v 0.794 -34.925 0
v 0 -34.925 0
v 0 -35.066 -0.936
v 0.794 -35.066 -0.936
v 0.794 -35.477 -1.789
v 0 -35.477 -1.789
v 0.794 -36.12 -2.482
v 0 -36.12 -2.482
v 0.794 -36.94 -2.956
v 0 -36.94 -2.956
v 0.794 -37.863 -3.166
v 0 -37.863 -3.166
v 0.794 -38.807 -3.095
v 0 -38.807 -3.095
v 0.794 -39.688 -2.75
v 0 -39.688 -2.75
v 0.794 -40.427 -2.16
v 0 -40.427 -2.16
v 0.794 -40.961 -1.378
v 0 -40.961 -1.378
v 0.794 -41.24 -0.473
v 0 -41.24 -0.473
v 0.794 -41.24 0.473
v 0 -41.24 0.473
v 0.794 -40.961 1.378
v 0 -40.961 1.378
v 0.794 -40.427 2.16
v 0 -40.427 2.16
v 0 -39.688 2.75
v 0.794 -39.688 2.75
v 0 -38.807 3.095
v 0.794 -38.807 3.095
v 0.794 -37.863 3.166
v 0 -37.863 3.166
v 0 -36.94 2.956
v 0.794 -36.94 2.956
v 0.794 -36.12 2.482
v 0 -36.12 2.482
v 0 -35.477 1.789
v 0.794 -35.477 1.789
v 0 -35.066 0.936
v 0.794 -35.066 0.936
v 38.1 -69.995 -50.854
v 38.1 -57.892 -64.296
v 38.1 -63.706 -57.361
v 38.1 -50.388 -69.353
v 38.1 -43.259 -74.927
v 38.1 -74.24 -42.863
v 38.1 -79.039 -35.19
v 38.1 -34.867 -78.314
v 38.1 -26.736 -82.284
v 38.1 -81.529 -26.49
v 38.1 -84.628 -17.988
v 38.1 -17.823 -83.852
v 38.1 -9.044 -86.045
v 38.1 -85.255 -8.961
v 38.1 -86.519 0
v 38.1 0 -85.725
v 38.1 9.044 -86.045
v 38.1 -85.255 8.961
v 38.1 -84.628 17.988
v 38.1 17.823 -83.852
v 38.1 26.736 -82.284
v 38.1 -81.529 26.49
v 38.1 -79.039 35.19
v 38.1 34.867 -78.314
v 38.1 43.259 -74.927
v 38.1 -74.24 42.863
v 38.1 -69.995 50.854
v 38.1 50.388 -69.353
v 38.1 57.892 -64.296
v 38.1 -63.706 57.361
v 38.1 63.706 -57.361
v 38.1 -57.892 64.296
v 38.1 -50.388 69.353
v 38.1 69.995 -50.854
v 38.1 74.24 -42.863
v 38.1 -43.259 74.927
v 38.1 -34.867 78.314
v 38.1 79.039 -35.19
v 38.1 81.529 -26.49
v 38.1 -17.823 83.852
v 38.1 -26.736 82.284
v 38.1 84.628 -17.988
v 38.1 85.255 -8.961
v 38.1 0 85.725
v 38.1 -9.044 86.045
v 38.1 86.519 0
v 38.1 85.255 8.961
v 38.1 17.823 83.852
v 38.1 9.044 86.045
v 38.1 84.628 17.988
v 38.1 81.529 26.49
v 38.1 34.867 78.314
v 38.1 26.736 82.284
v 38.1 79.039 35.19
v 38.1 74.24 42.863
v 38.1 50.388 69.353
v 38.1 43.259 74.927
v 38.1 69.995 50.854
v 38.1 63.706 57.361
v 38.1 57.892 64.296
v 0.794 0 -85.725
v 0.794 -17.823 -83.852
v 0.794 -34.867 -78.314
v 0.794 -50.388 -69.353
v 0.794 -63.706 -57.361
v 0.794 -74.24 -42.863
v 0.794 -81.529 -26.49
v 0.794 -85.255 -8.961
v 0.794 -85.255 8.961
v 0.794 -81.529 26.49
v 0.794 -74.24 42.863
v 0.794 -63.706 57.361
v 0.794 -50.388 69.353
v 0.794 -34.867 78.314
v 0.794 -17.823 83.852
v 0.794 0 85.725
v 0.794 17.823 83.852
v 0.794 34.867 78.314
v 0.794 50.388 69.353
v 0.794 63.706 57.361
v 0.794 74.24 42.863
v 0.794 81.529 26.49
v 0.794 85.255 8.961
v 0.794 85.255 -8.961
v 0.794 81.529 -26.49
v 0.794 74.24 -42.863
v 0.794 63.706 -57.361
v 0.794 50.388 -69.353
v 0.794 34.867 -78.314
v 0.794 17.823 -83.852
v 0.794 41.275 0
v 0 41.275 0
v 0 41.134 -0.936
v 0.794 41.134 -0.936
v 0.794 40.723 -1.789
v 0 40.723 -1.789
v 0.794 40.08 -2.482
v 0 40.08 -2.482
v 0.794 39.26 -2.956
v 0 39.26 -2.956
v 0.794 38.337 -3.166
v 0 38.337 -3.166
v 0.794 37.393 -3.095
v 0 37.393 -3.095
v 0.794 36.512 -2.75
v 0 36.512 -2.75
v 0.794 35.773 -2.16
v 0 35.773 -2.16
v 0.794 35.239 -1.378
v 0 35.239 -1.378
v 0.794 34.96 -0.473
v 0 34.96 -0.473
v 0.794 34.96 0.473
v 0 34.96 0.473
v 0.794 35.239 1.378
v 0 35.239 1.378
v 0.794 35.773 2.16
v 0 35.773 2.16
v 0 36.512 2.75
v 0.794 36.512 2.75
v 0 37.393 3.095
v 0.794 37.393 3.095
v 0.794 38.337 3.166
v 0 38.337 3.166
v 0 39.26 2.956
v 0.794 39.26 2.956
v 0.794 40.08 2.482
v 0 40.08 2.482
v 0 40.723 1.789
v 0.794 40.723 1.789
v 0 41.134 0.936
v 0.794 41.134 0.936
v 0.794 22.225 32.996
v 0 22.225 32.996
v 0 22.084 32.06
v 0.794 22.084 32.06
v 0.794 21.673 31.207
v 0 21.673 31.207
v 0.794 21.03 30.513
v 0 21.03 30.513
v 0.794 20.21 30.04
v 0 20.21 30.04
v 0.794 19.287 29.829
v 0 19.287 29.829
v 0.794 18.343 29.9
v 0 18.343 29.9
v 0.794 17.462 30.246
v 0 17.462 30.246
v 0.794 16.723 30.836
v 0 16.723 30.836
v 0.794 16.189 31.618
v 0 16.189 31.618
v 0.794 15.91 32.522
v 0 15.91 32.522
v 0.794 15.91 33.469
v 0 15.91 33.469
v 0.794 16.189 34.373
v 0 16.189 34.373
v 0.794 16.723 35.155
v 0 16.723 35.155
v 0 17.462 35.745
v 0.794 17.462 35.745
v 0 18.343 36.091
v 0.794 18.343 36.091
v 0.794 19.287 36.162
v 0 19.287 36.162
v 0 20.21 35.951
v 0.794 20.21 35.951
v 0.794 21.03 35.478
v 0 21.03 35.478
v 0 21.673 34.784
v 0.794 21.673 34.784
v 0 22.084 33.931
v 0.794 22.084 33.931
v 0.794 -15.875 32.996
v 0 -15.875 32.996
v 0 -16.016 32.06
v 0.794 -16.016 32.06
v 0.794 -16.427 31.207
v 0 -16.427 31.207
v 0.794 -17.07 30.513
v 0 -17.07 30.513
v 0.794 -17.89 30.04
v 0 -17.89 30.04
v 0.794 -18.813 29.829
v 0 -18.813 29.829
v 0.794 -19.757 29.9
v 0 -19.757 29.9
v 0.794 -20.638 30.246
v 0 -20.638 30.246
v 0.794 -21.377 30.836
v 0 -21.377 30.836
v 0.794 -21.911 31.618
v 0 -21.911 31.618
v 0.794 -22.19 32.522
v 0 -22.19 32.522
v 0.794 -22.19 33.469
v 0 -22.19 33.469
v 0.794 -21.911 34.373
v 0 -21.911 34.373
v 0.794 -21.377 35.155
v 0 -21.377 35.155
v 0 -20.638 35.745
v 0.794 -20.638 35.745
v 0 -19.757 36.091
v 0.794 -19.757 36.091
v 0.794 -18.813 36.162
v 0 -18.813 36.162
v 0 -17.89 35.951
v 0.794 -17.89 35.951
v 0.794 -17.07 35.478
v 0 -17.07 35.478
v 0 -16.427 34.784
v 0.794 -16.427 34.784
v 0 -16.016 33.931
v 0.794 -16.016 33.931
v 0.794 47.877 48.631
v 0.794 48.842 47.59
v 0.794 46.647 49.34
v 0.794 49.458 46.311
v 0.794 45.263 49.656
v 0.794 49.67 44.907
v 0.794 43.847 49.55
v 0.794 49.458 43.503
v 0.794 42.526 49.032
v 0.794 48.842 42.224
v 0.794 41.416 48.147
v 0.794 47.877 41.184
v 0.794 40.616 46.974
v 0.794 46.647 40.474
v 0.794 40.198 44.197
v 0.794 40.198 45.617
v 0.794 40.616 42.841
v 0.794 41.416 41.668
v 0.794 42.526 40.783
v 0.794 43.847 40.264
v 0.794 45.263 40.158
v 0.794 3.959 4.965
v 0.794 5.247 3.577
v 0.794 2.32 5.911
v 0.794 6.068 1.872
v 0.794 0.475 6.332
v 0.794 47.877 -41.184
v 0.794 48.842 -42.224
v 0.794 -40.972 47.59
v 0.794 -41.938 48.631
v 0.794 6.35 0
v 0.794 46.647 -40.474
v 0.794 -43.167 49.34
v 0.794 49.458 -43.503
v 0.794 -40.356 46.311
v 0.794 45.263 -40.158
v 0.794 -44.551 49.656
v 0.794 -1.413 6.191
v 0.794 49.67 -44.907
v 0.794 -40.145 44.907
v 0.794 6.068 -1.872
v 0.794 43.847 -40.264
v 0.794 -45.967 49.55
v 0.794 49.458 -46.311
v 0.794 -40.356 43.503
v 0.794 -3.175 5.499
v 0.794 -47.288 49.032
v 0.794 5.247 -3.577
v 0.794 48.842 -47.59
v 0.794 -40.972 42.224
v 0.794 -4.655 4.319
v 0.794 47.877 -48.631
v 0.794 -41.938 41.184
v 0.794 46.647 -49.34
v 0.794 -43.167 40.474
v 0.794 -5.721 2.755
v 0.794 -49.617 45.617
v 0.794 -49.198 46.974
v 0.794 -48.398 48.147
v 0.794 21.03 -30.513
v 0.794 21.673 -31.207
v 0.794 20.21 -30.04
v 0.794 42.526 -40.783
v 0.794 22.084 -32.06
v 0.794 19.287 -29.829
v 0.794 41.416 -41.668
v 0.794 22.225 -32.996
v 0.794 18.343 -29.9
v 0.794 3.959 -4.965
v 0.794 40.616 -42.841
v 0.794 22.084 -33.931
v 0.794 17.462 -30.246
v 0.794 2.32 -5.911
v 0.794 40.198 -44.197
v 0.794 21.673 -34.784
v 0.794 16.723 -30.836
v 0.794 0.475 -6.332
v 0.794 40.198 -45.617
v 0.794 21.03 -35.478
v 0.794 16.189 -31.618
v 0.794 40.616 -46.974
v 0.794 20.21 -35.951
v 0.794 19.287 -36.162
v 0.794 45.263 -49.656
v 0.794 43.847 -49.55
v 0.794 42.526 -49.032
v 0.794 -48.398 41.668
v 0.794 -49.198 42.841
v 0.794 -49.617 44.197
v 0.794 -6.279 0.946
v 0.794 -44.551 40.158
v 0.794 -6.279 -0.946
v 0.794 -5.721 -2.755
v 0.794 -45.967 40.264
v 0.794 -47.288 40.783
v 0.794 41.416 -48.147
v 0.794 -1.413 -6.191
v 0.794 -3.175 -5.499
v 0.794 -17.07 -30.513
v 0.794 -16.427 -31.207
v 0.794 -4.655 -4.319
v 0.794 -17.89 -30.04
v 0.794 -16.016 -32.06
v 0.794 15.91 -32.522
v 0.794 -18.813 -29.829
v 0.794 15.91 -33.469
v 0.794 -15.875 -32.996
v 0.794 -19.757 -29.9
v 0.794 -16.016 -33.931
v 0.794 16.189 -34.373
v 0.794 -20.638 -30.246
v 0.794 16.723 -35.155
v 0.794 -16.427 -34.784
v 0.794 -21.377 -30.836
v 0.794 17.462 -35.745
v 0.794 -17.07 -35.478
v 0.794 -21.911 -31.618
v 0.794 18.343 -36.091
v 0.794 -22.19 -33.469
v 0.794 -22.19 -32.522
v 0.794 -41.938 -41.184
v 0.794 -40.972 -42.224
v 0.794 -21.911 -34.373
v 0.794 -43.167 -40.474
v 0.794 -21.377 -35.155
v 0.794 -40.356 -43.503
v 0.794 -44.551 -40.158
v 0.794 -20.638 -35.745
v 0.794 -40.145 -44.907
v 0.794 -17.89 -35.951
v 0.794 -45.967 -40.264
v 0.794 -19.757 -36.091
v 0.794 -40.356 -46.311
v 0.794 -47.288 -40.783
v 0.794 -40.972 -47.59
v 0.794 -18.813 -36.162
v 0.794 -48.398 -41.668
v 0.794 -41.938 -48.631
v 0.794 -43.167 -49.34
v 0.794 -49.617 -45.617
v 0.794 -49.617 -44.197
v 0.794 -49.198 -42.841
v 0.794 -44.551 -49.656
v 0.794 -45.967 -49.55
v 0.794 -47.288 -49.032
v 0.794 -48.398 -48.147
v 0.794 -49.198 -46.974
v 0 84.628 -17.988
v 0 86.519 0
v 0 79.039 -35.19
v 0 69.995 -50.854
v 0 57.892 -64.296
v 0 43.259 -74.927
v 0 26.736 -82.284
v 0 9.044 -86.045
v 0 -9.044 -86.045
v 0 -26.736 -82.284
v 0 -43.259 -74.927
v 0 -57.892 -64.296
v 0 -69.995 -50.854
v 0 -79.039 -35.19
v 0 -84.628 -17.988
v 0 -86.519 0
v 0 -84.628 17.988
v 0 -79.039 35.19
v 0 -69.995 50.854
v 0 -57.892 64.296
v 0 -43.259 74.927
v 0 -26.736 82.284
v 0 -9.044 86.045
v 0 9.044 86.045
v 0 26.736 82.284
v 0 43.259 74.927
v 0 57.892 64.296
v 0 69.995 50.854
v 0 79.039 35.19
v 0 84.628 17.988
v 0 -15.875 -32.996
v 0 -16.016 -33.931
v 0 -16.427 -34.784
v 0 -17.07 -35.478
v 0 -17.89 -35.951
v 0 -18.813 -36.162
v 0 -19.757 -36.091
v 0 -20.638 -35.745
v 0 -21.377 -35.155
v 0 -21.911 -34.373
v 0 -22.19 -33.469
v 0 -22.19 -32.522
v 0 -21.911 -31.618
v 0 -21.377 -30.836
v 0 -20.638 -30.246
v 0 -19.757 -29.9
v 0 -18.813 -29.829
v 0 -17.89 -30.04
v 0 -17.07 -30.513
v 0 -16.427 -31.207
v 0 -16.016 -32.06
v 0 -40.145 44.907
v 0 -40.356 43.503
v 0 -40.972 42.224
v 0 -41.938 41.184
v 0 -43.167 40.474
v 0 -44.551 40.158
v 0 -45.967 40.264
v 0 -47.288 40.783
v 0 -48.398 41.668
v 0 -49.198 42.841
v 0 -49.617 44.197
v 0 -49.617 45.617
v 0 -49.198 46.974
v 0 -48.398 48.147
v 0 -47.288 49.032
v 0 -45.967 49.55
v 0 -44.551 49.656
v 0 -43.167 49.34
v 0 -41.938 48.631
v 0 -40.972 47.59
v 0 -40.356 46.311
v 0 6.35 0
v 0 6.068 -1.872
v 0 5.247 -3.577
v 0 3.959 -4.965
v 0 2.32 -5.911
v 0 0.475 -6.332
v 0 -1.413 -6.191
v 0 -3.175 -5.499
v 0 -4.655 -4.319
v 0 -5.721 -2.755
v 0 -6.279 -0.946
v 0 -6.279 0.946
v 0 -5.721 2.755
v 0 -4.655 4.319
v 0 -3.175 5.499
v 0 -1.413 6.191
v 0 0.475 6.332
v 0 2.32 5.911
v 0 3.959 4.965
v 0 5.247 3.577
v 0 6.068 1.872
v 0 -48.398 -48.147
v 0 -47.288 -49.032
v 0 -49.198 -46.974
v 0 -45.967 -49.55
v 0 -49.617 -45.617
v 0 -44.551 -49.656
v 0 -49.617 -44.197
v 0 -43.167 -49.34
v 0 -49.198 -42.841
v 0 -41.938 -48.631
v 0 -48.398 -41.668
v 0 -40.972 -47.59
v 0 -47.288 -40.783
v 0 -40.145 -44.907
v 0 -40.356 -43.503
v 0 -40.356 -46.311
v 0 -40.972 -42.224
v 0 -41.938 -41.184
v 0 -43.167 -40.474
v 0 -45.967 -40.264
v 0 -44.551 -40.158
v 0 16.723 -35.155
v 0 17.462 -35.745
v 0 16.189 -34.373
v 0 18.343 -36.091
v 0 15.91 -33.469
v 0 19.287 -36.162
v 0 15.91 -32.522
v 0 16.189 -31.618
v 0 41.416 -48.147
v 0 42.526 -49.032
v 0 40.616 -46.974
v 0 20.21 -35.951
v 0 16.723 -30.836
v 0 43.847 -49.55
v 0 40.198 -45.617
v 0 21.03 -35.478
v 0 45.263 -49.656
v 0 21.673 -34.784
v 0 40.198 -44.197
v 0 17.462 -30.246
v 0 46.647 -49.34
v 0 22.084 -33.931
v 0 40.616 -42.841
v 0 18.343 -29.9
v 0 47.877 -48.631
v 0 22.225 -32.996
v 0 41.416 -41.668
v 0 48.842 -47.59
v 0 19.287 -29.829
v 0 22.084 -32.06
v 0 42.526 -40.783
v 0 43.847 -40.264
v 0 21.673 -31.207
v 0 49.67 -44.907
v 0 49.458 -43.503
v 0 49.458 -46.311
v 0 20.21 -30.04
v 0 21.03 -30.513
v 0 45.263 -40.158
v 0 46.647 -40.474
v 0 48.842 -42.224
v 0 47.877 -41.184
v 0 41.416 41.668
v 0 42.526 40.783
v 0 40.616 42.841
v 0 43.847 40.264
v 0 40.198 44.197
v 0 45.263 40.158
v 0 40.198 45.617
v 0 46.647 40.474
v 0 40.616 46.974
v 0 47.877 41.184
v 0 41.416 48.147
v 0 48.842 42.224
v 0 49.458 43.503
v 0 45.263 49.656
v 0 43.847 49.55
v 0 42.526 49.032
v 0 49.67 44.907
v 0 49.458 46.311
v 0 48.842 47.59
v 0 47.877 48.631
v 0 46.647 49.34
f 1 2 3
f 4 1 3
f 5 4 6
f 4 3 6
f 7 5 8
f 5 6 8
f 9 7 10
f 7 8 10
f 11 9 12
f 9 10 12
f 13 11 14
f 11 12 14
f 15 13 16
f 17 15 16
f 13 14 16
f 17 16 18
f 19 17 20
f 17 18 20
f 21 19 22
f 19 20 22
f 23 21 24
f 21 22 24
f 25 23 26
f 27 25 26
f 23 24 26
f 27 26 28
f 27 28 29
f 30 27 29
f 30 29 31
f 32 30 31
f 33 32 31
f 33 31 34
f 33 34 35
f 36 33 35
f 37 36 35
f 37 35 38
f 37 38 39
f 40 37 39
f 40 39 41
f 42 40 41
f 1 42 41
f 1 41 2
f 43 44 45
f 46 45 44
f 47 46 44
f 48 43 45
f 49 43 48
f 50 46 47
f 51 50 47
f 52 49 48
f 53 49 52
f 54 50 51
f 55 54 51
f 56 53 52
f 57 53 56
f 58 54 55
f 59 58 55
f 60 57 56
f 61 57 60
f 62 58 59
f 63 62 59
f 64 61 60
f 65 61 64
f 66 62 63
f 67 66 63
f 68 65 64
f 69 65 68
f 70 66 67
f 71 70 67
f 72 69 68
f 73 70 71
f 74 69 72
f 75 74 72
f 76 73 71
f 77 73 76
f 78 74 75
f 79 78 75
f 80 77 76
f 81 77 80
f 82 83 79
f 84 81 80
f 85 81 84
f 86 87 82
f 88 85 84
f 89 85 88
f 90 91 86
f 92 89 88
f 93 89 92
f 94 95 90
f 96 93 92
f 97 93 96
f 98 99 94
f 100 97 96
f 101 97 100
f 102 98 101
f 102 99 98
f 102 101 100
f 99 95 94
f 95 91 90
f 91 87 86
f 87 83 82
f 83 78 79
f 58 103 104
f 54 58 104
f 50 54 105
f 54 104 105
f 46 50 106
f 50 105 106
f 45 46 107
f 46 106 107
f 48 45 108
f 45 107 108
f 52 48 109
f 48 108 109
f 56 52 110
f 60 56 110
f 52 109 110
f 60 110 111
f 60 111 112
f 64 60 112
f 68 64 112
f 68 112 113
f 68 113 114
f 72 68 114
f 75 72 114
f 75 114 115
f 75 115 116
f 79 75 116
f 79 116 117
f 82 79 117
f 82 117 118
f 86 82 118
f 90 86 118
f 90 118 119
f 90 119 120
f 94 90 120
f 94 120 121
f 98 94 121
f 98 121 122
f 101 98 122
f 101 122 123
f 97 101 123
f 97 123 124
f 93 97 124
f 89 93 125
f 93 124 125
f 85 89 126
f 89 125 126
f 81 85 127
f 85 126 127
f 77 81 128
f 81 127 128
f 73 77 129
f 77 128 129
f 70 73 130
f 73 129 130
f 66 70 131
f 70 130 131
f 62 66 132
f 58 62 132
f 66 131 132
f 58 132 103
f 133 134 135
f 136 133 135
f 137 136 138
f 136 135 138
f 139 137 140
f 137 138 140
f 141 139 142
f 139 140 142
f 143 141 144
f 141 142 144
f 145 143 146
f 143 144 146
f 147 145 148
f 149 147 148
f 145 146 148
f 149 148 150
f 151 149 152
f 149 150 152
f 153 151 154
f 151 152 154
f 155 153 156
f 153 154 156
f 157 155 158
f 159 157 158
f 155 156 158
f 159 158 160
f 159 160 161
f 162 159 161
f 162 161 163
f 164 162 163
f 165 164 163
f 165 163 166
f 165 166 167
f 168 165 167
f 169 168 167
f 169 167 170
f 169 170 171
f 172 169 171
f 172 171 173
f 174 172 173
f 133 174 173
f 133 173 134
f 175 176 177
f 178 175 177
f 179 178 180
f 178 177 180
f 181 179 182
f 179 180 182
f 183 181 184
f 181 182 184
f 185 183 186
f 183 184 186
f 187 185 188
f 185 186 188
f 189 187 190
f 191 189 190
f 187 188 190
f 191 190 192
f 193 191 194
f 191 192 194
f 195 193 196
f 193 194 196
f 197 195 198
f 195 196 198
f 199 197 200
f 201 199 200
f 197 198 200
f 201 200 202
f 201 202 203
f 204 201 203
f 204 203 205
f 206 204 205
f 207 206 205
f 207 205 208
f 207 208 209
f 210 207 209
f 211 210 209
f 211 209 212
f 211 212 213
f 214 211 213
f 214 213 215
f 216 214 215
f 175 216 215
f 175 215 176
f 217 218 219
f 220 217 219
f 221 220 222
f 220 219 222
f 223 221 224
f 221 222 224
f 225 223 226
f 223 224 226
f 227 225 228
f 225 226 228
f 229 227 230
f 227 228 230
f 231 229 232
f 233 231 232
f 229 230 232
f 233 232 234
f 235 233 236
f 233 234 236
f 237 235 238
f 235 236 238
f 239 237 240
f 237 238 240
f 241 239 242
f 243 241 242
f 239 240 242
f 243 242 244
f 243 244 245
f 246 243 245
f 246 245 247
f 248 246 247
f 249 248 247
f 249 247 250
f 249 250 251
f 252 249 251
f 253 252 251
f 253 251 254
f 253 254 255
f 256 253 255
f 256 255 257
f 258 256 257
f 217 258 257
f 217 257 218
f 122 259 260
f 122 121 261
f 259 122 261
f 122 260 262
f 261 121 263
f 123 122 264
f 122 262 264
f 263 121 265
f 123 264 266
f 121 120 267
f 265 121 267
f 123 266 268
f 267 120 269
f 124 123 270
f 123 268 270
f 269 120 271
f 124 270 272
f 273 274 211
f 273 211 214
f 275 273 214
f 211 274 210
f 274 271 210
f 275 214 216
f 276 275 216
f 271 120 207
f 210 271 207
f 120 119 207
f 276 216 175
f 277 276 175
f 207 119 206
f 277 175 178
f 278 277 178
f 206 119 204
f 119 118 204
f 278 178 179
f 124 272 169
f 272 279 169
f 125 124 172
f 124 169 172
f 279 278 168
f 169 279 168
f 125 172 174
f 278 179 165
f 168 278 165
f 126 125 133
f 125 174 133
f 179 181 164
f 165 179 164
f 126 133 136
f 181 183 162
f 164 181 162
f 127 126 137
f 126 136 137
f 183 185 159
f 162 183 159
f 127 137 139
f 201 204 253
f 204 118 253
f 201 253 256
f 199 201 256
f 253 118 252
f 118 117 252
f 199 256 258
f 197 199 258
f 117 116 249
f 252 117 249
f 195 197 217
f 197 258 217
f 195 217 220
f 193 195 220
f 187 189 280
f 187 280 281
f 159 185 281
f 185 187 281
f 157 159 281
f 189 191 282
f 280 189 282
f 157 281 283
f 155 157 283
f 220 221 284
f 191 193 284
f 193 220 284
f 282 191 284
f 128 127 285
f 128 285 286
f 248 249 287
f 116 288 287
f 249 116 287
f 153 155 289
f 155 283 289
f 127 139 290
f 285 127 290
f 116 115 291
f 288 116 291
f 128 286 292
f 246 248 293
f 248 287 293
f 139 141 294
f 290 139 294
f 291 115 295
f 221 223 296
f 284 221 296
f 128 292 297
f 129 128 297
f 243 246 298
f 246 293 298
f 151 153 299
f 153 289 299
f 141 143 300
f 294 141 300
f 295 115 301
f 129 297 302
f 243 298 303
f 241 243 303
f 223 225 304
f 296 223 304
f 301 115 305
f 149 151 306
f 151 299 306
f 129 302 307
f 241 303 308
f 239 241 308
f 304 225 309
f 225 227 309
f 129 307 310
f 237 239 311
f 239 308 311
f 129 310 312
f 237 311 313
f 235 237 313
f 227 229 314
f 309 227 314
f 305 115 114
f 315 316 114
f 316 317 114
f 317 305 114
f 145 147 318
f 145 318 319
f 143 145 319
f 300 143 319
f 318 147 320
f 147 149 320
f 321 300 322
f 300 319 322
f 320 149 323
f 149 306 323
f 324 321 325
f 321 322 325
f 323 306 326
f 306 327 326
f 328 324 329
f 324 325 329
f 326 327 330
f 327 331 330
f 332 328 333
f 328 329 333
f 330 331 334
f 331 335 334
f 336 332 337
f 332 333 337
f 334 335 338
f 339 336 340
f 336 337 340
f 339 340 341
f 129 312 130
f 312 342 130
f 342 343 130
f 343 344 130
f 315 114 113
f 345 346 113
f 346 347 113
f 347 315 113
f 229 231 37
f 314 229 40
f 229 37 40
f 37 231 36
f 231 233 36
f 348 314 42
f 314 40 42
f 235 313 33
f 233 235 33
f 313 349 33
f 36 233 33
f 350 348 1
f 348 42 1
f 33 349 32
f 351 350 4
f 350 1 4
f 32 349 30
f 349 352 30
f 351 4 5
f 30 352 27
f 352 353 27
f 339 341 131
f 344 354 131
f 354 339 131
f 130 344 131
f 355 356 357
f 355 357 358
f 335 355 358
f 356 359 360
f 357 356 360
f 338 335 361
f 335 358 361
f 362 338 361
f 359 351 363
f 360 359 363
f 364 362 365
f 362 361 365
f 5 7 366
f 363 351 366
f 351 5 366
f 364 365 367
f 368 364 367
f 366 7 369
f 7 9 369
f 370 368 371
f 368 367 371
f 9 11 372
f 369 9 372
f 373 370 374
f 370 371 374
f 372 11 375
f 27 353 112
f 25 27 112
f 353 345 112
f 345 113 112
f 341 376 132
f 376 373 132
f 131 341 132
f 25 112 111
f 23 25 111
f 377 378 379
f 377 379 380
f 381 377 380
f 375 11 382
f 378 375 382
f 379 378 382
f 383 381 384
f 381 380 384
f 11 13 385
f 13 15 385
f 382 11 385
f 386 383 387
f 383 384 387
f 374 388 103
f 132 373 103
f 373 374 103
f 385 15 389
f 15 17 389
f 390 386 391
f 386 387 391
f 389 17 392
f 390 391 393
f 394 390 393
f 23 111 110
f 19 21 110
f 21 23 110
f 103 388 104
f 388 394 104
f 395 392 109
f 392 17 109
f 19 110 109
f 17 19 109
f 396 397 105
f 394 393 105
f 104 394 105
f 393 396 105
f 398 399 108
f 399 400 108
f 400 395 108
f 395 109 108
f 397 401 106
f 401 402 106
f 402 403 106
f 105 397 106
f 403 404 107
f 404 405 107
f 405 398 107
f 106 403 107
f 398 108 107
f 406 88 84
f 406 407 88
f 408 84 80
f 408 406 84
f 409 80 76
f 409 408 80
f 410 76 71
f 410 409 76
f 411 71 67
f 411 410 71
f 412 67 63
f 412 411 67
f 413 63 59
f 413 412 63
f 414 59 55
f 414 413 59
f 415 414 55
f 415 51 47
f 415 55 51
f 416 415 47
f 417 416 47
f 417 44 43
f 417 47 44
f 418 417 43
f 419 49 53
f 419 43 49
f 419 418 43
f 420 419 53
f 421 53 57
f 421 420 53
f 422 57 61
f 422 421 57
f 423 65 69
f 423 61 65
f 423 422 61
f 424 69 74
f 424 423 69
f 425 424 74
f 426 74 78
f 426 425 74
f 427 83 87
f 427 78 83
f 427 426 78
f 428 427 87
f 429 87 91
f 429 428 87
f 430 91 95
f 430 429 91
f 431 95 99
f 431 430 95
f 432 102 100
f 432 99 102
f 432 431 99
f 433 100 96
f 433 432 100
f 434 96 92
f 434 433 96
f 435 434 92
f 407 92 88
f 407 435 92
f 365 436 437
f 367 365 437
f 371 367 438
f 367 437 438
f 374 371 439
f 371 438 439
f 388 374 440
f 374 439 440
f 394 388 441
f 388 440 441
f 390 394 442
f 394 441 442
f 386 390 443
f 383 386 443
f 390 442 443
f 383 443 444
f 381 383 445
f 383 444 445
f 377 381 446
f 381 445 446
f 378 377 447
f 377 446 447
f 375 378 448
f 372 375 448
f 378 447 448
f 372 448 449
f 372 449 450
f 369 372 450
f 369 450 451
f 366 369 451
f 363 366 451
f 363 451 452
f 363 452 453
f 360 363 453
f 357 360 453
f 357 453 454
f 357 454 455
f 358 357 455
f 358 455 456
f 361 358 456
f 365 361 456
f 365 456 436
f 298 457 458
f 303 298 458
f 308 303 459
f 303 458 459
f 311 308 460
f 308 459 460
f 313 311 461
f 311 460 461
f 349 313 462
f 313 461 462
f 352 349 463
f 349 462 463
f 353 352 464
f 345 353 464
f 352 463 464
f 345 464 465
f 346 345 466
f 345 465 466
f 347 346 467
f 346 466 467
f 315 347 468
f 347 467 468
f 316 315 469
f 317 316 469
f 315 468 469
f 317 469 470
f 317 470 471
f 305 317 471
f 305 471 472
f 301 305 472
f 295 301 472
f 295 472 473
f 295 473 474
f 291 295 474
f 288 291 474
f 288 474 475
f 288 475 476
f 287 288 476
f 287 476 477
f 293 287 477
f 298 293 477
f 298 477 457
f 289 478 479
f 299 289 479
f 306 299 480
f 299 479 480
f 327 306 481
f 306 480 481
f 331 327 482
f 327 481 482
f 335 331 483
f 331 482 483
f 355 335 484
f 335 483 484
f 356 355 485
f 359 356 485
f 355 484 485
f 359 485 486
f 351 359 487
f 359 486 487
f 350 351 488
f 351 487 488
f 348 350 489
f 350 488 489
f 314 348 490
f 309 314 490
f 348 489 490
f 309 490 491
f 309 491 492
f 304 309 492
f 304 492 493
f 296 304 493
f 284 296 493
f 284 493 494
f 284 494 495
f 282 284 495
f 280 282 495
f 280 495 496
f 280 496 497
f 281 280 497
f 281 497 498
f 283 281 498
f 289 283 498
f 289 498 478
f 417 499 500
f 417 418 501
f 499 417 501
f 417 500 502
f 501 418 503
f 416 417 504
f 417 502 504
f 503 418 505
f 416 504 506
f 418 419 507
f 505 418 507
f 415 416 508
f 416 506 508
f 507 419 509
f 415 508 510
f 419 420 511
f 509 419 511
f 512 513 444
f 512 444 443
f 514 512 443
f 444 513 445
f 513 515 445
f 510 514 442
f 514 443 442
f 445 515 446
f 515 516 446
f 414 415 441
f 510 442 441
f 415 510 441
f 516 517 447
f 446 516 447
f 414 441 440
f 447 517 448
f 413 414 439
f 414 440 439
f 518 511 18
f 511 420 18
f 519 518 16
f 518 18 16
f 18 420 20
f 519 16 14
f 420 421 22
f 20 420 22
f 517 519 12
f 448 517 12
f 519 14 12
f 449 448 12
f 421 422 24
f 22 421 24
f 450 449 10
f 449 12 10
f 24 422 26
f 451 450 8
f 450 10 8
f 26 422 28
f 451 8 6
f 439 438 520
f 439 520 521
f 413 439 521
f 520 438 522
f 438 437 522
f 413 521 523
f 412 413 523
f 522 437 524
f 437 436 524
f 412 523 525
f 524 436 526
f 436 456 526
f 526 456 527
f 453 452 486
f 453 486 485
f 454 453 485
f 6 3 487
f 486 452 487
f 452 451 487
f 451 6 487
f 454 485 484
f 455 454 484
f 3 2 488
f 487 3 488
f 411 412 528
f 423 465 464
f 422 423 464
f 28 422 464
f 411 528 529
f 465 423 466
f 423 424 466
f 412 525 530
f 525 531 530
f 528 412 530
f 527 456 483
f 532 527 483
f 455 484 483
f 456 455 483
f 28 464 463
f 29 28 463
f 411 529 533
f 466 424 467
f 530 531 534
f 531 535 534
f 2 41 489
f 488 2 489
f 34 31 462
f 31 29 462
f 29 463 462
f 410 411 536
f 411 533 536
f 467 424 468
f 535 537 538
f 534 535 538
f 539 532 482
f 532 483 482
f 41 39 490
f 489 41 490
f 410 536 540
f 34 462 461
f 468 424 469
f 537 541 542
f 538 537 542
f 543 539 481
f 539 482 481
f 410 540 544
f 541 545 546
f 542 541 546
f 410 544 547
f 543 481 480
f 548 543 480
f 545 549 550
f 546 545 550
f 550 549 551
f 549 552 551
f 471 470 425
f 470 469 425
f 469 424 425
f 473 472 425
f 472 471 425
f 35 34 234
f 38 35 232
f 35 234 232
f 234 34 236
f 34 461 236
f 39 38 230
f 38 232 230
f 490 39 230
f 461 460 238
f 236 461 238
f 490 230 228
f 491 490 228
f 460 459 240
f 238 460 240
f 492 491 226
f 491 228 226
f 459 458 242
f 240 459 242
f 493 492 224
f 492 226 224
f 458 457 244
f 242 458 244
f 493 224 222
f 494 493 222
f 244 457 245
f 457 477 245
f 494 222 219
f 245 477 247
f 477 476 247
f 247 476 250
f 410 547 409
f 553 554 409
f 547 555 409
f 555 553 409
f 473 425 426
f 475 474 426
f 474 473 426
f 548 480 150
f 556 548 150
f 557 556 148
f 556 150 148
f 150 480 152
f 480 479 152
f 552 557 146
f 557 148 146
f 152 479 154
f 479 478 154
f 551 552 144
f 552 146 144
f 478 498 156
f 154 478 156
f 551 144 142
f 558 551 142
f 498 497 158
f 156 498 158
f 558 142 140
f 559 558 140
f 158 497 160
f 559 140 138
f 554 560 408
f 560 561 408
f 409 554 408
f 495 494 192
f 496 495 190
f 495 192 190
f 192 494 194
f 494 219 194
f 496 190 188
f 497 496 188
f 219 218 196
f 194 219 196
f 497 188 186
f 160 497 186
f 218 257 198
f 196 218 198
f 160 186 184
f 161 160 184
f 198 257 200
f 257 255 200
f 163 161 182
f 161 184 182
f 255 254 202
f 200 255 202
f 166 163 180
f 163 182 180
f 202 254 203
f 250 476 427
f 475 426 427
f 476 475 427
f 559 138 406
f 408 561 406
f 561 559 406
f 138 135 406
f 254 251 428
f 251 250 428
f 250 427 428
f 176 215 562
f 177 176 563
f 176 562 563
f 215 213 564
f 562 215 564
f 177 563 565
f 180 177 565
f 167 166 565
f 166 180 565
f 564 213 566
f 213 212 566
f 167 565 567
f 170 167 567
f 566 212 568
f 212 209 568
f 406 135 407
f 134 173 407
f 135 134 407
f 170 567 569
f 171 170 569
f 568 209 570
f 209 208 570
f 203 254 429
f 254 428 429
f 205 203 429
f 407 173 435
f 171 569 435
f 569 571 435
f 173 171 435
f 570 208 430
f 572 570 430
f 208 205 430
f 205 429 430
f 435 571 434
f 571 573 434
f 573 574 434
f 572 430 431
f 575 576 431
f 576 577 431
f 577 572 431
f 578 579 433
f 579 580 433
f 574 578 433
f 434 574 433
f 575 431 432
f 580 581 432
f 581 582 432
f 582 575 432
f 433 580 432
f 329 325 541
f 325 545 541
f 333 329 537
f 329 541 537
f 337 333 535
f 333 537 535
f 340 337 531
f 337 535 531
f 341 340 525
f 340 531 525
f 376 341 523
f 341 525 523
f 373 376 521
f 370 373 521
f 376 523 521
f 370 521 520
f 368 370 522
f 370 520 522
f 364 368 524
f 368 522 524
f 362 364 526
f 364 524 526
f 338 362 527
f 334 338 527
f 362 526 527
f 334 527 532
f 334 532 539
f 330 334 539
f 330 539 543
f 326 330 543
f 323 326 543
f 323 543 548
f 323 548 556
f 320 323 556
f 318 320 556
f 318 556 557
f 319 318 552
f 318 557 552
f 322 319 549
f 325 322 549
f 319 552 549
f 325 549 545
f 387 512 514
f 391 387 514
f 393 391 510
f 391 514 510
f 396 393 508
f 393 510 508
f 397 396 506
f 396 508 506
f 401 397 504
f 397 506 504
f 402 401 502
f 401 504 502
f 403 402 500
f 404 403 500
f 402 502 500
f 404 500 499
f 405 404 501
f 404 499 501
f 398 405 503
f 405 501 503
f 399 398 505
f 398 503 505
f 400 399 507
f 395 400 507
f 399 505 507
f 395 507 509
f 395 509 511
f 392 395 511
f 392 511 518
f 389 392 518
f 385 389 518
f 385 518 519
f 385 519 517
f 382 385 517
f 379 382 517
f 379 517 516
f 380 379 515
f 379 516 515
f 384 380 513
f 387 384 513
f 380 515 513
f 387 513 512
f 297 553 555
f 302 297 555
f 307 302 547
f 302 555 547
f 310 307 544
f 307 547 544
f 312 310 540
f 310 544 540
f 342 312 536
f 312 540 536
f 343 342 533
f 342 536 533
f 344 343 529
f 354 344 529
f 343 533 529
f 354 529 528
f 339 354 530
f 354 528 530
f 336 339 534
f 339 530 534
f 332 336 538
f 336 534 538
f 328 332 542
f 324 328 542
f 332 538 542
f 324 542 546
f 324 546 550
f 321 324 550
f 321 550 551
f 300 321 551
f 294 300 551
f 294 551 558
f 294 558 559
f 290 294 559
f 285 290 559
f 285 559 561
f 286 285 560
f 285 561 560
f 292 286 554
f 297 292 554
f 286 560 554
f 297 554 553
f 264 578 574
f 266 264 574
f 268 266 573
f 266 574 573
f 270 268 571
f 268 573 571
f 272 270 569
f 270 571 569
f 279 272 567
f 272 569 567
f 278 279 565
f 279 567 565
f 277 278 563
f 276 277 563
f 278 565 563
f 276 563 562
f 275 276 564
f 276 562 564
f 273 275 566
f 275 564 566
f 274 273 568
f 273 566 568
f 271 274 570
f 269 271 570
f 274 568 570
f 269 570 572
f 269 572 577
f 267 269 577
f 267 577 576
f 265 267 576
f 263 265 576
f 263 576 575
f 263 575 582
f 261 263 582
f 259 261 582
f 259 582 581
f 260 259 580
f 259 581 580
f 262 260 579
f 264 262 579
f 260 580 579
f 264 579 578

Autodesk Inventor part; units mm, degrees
ref_plane "YZ Plane" through (0, 0, 0) normal (1, 0, 0) x (0, 1, 0)
ref_plane "XZ Plane" through (0, 0, 0) normal (0, 1, 0) x (-1, 0, 0)
ref_plane "XY Plane" through (0, 0, 0) normal (0, 0, 1) x (1, 0, 0)
sketch "Sketch1" plane through (0, 0, 0) normal (1, 0, 0) x (0, 1, 0)
  circle A0 centre (0, 0) radius 86.5188
  circle A1 centre (0, 0) radius 6.35
  circle A2 centre (-38.1, 0) radius 3.175
  circle A3 centre (-19.05, -32.9956) radius 3.175
  circle A4 centre (19.05, -32.9956) radius 3.175
  circle A5 centre (38.1, 0) radius 3.175
  circle A6 centre (19.05, 32.9956) radius 3.175
  circle A7 centre (-19.05, 32.9956) radius 3.175
  circle A8 centre (-44.9072, -44.9072) radius 4.7625
  line L0 (0, 0) -> (-44.9072, -44.9072) construction
  line L1 (0, 0) -> (0, -86.5188) construction
  circle A9 centre (44.9072, -44.9072) radius 4.7625
  circle A10 centre (44.9072, 44.9072) radius 4.7625
  circle A11 centre (-44.9072, 44.9072) radius 4.7625
  dimension "d0" = 173.0375
  dimension "d1" = 12.7
  dimension "d2" = 6.35
  dimension "d3" = 38.1
  dimension "d6" = 360
  dimension "d8" = 9.525
  dimension "d9" = 45
  dimension "d13" = 360
  dimension "d26" = 89.8144
extrude "Extrusion1" add sketch "Sketch1" along normal blind 38.1
hole "Hole1" at (38.1, 0, 0) direction (-1, 0, 0) diameter 171.45 depth 37.3062
properties part number "bottom cap"
